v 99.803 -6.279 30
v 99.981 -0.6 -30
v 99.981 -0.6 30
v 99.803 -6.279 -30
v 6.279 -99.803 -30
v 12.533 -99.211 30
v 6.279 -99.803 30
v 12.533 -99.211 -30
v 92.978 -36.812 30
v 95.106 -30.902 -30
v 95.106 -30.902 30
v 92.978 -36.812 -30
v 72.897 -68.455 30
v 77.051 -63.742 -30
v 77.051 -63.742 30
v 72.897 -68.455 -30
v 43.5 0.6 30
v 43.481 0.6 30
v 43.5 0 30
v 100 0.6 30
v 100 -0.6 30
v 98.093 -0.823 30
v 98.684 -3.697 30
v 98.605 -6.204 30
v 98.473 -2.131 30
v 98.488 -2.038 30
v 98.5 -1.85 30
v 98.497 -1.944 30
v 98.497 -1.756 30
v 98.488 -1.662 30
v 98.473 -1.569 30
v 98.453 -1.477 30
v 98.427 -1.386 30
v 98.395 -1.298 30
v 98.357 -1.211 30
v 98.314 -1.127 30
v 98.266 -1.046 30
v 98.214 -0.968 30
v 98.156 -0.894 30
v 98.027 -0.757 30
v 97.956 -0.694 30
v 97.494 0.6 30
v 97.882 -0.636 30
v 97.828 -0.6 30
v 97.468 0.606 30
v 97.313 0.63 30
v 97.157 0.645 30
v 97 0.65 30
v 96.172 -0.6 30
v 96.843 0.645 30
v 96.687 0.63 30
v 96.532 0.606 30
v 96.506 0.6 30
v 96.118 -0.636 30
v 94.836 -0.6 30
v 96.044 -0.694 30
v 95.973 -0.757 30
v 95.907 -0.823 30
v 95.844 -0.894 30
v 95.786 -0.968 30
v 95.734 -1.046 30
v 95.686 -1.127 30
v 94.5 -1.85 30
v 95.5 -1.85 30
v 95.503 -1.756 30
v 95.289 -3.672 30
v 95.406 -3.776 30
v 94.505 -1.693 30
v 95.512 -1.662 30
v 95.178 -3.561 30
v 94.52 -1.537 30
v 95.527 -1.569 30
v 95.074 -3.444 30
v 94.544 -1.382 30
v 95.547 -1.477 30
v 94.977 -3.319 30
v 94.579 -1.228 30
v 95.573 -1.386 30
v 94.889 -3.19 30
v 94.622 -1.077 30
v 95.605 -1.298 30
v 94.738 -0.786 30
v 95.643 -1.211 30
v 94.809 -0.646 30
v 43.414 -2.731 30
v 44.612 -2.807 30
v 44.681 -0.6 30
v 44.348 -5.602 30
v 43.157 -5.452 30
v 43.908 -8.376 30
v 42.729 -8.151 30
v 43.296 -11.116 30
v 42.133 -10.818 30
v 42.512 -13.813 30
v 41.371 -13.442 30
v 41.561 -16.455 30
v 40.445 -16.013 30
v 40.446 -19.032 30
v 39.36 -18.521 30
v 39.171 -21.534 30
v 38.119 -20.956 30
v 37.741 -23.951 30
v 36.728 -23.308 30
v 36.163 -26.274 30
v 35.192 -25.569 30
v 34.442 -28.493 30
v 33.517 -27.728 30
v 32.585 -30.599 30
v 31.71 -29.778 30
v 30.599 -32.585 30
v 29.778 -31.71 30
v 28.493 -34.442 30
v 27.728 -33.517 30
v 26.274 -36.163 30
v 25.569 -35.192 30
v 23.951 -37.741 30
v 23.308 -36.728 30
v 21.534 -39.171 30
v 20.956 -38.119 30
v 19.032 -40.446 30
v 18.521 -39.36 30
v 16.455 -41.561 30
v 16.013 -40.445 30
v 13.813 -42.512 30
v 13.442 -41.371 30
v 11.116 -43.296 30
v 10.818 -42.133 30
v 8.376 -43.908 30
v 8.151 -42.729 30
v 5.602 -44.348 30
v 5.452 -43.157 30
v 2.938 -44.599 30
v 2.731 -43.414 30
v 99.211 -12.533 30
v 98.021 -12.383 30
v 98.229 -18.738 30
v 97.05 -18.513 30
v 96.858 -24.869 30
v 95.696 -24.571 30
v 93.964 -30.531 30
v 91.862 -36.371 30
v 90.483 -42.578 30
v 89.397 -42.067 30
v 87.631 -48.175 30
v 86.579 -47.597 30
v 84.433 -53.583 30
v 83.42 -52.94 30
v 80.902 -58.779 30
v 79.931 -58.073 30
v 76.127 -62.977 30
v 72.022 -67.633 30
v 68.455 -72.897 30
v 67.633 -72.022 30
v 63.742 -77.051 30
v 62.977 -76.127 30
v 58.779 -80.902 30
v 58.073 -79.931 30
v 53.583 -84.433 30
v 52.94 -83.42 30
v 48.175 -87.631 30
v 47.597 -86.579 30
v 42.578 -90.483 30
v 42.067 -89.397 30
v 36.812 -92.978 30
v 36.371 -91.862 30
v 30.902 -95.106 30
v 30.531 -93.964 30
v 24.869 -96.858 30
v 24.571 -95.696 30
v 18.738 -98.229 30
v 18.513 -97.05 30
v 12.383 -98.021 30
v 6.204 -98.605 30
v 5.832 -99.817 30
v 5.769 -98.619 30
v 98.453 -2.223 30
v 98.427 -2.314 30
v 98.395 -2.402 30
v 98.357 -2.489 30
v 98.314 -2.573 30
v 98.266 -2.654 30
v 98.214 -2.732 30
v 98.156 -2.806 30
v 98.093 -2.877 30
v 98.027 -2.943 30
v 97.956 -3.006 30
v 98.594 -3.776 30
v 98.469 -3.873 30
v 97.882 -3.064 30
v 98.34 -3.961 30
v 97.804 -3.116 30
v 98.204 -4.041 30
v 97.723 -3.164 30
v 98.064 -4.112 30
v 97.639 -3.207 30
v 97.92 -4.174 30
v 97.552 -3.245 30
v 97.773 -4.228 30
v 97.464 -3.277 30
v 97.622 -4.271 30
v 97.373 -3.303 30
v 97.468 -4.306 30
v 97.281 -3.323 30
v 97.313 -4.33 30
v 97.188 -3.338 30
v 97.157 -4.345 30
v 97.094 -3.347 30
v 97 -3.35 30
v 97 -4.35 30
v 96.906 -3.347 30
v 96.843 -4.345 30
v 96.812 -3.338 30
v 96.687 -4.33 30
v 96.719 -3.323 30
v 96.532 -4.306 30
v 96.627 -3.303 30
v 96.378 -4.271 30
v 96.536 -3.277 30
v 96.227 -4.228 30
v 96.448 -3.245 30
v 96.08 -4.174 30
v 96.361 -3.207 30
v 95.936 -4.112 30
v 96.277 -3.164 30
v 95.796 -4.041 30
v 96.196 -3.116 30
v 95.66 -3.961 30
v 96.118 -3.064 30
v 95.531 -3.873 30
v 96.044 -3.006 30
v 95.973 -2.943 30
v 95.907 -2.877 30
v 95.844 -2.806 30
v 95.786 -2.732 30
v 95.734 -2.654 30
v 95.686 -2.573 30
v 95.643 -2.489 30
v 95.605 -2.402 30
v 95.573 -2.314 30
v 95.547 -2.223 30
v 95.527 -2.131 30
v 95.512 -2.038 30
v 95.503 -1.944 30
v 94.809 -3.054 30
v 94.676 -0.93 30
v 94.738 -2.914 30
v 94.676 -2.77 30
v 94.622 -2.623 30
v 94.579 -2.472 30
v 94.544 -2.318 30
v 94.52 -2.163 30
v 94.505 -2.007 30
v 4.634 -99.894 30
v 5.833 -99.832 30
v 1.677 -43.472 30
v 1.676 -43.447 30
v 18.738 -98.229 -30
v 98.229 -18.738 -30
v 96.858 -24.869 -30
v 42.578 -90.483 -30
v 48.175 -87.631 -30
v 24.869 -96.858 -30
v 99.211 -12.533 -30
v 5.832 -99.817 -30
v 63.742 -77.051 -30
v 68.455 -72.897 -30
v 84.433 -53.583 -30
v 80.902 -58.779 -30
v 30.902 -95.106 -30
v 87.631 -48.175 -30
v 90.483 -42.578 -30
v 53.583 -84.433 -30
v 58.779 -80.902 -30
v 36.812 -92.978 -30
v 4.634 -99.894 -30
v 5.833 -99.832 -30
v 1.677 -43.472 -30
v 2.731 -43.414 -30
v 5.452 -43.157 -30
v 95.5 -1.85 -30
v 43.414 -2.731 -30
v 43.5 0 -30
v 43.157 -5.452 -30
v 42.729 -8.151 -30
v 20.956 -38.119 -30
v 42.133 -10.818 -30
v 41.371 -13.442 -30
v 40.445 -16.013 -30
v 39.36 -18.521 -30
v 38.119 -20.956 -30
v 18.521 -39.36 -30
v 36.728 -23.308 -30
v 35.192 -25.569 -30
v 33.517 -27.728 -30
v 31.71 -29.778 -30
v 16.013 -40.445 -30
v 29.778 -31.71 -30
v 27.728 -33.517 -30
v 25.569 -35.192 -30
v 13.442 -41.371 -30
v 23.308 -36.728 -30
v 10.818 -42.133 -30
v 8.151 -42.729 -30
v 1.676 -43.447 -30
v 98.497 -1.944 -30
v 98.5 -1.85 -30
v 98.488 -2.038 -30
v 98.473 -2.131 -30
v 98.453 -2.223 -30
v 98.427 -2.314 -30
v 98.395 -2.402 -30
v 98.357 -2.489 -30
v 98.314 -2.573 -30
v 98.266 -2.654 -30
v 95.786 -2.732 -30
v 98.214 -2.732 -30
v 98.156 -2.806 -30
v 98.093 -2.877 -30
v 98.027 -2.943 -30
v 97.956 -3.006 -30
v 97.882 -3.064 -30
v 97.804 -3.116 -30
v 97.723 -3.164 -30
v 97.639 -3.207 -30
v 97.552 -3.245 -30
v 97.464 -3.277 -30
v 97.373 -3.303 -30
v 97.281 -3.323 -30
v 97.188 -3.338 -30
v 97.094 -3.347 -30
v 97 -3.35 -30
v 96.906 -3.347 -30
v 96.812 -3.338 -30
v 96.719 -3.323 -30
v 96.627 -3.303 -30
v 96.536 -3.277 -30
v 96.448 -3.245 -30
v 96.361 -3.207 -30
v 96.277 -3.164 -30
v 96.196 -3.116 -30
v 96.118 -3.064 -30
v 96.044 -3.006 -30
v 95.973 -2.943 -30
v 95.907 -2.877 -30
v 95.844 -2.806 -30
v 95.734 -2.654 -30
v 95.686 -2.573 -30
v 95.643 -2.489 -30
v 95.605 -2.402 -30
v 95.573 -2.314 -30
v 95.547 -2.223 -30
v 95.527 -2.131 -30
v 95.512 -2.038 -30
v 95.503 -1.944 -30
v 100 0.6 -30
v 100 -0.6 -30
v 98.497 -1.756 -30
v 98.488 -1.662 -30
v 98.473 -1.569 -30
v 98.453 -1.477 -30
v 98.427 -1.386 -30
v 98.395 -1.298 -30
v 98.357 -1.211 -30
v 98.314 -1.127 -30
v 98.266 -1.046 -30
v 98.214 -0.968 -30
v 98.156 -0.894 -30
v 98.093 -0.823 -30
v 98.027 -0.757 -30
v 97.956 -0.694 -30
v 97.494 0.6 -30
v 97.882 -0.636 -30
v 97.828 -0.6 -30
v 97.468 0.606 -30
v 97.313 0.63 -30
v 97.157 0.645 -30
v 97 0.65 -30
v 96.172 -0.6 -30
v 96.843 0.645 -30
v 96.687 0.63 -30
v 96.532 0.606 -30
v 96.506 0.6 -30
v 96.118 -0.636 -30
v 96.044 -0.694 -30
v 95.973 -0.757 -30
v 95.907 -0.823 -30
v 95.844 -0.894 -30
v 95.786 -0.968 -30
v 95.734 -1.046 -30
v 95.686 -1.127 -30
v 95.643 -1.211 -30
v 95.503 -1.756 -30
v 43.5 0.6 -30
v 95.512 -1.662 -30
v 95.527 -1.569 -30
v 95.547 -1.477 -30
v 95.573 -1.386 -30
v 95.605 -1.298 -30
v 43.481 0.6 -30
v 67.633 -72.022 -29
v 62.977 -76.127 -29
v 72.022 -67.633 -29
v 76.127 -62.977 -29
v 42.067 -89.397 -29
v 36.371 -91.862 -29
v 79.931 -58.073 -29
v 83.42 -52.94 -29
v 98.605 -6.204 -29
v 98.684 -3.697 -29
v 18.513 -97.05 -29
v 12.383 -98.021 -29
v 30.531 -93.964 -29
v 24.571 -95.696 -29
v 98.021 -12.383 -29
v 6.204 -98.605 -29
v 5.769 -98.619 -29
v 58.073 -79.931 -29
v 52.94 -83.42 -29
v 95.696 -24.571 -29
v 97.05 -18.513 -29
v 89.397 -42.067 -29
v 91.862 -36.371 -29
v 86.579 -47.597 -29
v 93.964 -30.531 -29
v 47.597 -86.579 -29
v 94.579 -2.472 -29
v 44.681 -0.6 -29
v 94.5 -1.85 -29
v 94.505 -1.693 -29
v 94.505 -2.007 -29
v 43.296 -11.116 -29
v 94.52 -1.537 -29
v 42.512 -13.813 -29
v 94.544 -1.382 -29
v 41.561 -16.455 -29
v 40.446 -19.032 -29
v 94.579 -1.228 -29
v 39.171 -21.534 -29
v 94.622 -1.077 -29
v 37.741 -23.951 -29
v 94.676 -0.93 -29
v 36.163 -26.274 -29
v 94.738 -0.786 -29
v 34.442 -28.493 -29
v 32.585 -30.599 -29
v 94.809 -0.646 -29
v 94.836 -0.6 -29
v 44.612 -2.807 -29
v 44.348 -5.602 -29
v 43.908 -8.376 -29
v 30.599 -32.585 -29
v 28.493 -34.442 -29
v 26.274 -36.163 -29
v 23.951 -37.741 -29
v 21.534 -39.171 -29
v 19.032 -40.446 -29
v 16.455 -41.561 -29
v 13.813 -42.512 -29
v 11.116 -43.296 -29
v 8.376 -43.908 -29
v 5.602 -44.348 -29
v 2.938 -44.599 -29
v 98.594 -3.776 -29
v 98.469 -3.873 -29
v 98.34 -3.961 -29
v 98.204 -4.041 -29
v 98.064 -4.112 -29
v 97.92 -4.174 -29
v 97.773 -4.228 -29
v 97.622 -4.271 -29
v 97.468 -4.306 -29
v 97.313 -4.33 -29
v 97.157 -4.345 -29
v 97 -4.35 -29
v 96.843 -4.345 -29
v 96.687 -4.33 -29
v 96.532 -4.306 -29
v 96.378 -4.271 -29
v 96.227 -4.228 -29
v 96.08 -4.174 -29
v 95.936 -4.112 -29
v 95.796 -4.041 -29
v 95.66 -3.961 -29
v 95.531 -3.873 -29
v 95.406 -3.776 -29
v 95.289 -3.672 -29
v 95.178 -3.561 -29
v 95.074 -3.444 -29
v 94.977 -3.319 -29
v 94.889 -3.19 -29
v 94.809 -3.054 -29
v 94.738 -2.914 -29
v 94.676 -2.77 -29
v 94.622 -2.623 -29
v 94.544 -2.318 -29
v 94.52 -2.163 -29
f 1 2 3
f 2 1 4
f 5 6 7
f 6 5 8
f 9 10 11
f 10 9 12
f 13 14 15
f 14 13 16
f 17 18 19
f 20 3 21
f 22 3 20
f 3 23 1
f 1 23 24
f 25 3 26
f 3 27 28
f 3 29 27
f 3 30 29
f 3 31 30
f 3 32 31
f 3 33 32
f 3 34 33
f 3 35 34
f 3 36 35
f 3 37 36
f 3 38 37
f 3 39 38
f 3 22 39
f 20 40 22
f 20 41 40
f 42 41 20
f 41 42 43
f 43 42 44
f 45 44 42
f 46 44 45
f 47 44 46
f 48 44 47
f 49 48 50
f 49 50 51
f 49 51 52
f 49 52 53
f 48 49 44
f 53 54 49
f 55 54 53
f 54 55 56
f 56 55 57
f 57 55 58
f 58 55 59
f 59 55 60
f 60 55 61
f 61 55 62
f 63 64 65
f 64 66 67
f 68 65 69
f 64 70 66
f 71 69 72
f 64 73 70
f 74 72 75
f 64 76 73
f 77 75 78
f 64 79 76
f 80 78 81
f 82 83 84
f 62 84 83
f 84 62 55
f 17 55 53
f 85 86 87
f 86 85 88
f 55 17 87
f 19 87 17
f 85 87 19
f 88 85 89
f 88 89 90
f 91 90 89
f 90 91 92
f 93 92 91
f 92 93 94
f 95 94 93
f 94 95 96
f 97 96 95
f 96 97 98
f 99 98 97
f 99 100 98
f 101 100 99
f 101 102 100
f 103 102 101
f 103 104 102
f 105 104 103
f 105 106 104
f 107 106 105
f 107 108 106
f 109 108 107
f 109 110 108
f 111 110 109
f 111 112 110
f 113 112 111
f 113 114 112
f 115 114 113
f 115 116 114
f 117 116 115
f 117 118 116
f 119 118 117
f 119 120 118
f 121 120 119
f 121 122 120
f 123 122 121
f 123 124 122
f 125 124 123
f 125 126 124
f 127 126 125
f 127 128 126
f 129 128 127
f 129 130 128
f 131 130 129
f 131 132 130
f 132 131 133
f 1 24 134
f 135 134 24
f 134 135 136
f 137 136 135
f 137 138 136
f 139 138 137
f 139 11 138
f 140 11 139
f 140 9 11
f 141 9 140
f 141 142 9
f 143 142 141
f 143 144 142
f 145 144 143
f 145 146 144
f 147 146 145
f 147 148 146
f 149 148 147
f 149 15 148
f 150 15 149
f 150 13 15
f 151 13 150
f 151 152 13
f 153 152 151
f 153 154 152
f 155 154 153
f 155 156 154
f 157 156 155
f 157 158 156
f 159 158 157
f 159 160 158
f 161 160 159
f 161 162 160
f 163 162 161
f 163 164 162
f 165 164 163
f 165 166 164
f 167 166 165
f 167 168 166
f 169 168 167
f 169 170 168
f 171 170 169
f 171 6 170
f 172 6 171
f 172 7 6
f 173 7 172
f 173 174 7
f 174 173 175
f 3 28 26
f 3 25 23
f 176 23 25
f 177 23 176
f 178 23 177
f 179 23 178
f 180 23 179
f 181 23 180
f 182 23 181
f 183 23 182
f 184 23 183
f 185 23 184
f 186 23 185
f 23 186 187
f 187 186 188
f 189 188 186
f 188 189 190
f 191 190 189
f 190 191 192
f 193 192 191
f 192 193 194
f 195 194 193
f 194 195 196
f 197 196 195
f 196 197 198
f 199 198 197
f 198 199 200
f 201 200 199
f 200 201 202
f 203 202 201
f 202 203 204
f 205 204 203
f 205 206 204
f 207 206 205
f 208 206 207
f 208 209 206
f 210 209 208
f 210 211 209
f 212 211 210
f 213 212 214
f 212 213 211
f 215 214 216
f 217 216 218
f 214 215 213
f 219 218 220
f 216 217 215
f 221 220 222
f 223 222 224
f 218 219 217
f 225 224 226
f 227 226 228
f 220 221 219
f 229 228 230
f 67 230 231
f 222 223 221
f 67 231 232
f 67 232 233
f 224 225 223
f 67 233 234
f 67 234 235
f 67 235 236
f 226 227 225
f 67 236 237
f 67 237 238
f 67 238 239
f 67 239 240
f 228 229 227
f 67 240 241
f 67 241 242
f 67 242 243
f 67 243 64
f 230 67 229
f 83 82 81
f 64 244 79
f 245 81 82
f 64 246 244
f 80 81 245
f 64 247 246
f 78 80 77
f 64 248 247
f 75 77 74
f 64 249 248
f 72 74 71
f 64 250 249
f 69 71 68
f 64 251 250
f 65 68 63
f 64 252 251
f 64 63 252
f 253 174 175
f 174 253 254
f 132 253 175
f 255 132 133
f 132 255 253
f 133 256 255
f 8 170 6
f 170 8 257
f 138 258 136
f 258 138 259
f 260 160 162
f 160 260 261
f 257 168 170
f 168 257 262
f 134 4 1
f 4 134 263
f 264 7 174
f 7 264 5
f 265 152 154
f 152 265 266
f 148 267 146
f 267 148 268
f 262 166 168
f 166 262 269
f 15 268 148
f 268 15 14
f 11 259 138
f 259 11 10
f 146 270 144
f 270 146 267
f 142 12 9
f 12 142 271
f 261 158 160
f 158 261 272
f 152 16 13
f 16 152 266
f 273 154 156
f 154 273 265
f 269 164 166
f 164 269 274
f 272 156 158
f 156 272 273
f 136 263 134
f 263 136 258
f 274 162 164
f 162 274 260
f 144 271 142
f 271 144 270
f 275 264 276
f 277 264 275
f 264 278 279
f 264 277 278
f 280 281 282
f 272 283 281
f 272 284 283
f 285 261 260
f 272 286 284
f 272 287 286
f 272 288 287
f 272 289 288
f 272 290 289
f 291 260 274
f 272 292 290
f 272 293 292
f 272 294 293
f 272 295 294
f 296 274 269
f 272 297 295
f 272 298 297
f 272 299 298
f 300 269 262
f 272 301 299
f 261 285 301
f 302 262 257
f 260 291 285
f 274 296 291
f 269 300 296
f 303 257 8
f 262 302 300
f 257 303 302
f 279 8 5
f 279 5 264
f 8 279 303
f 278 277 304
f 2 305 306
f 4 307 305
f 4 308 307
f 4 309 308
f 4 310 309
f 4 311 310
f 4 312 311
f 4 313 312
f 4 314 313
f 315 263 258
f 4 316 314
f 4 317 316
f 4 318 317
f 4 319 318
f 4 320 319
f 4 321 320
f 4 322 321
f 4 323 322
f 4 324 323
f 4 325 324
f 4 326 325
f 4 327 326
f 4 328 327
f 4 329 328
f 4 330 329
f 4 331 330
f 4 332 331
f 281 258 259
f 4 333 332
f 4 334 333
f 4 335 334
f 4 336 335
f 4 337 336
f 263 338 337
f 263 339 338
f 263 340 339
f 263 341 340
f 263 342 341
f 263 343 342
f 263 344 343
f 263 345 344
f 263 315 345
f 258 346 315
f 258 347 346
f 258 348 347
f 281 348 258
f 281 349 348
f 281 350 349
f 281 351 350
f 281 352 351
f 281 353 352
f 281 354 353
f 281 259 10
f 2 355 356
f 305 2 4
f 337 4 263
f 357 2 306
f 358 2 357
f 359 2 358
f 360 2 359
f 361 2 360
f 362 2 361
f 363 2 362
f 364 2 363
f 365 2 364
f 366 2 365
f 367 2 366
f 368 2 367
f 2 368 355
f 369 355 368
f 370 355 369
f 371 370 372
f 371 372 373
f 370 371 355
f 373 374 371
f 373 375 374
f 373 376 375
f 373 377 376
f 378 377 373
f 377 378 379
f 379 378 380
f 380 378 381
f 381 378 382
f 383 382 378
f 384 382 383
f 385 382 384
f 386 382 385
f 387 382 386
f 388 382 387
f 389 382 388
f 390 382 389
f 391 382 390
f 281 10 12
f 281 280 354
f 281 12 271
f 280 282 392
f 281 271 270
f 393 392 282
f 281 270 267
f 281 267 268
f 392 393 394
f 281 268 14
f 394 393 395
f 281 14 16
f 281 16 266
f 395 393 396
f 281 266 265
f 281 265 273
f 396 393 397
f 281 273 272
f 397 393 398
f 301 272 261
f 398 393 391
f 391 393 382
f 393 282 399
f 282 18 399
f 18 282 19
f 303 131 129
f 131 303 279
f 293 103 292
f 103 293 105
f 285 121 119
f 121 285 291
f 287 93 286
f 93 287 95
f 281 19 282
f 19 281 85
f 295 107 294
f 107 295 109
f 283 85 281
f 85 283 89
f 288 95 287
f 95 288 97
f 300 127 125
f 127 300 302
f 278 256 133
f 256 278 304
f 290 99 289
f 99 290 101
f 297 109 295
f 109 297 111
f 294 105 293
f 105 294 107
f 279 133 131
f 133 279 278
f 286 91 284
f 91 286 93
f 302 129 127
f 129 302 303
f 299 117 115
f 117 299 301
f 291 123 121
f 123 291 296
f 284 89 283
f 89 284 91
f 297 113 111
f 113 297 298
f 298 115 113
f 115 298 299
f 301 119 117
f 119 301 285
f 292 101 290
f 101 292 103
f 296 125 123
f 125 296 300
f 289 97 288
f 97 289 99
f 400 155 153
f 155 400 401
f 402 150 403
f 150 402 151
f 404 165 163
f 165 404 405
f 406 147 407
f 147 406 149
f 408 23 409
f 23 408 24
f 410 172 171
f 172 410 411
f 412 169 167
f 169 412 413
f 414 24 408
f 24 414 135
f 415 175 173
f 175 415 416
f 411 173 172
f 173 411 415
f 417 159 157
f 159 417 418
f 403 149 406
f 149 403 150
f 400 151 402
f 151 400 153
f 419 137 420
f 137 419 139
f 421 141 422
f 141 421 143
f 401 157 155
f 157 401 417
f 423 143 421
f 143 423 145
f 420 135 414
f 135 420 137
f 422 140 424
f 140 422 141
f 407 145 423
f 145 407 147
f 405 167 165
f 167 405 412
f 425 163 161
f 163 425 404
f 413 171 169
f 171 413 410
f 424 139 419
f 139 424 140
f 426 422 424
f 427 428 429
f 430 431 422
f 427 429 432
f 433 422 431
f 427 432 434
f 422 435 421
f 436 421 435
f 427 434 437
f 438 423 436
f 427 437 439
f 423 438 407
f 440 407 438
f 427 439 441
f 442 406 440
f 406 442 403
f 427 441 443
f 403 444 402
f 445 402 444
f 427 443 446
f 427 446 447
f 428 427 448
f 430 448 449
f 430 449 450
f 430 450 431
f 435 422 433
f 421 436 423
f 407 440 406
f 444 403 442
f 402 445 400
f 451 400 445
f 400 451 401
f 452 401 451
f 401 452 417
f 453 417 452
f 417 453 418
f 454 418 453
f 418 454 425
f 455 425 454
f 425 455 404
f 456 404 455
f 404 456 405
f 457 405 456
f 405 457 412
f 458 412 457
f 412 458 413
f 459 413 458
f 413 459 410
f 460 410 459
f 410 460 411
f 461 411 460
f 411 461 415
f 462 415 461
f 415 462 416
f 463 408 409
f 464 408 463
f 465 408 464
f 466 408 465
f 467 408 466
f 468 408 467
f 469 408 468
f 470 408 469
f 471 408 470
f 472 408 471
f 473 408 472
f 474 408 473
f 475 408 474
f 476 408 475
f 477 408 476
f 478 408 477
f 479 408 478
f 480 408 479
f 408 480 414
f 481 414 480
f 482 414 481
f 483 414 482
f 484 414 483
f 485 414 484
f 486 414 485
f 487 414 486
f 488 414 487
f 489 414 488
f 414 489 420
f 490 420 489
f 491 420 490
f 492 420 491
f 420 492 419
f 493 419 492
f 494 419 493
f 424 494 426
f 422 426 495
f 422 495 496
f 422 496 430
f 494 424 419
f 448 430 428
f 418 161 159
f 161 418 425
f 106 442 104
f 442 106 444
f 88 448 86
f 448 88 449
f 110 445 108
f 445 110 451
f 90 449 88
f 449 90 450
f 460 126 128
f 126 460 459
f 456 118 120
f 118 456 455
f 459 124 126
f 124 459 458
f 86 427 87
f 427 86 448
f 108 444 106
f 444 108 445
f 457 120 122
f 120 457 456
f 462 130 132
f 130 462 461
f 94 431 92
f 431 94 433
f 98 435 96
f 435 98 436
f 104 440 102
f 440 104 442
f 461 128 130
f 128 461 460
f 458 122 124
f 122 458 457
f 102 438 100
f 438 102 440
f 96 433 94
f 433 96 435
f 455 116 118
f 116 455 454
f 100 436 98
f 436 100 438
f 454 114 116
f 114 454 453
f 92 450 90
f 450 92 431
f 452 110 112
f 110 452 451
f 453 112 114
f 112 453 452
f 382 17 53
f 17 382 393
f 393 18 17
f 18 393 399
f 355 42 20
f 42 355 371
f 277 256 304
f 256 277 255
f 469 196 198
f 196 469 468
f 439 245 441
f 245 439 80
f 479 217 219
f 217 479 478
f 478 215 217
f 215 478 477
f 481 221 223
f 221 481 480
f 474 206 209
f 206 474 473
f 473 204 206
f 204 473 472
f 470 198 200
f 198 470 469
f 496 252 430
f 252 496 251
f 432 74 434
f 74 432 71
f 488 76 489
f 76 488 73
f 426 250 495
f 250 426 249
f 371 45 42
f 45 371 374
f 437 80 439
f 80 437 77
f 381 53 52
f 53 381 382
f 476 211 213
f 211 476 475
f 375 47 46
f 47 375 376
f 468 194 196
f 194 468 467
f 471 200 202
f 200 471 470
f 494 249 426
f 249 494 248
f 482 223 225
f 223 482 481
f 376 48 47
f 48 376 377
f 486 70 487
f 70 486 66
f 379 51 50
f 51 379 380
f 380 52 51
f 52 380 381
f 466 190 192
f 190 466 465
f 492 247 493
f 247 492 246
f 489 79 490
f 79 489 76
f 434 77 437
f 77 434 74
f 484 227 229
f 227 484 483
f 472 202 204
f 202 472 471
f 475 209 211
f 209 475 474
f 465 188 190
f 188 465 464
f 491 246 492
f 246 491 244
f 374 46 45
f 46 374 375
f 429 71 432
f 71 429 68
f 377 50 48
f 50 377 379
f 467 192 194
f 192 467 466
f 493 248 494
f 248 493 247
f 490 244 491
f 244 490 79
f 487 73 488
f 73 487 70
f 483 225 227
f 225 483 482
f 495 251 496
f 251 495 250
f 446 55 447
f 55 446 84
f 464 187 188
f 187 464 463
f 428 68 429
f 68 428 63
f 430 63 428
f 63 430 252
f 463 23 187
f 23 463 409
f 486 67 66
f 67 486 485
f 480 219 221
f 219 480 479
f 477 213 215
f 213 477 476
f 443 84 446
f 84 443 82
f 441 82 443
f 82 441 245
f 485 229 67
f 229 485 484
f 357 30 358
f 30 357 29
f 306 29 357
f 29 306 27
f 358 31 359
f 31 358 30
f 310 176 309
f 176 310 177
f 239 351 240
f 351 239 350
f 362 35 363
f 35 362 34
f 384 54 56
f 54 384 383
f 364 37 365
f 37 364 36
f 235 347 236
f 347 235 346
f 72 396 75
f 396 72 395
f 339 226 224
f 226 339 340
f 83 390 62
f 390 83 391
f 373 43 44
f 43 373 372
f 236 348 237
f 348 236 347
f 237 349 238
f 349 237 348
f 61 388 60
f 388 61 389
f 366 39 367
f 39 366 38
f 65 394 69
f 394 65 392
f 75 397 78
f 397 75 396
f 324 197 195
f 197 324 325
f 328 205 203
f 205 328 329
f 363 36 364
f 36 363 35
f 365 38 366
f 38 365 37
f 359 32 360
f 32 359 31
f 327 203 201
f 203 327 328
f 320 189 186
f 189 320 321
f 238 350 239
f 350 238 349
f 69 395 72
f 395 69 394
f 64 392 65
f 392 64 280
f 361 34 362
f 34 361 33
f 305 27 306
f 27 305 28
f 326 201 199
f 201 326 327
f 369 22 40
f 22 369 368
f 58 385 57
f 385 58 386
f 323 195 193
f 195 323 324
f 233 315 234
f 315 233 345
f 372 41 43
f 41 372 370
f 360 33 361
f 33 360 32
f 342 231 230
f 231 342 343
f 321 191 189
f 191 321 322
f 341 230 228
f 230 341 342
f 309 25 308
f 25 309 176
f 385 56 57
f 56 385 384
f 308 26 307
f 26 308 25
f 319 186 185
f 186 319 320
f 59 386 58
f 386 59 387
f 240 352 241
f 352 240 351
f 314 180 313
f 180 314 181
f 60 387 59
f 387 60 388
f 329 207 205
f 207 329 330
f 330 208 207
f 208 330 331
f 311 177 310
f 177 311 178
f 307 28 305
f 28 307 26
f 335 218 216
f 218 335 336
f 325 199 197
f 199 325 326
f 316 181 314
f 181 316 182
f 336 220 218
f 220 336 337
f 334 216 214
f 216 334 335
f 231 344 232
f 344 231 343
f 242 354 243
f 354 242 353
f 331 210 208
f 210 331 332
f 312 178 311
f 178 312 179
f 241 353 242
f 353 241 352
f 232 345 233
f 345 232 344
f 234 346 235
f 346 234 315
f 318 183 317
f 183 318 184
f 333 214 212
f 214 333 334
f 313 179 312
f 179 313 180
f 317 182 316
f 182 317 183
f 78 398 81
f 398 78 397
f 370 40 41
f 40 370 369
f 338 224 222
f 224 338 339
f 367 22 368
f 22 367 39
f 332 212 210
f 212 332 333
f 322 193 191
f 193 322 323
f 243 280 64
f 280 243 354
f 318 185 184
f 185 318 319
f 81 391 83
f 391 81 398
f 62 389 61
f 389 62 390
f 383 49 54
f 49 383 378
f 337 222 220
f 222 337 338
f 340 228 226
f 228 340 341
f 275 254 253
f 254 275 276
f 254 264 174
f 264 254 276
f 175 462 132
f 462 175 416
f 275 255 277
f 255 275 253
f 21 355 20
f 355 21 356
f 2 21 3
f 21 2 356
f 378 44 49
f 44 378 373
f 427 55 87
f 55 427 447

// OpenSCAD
// bits and bobs for a spool-based tool organizer
// 2019 Troseph
// https://www.thingiverse.com/thing:3626779

$fn=100;
//  spool info
mainDia=200;
innerDia=87;
wallthickness=1.2;
middleDia=140;
// set to 60 for type 1
wallheight=60;

//  variables for type 5
//  the tool holder diameter (must be slightly larger than the tool)
toolHandleDia=15;
//  hole for tool to go through
toolDia=6;
//  depth of the cup to hold a tool
toolHolderHeight=15;

//  type 1 is for 1/4th swinging drawers
//  type 2 is half a bottom tray
//  type 3 is the whole bottom tray, but I don't know how you'll get it on a typical spool
//  type 4 is 1/6th tray with center dividers
//  type 5 is for screw driver holders
type=1;

// magic
spokeLen=(mainDia/2)-(innerDia/2);
spokeOffset=(innerDia/2)+(spokeLen/2);

module do_it(){
  if (type==1) {
    bottom_cup_1_4th();
  }
  if (type==2) {
    bottom_cup_half();
  }
  if (type==3) {
    bottom_cup();
  }
  if (type==4) {
    bottom_cup_1_6th();
  }
  if (type==5) {
    tool_holder();
  }
}


module bottom_cup_half(){
  difference(){
    bottom_cup();
    chop_block();
  }
}
module chop_block(){
  translate([0,(mainDia/2)+(wallthickness/2),0])cube([mainDia,mainDia,(wallheight+4)],true);
}
module bottom_cup_1_4th(){
  rotate([0,0,-87]) translate([spokeOffset,0,0])cube([spokeLen,wallthickness,wallheight],true);
  translate([spokeOffset,0,0])cube([spokeLen,wallthickness,wallheight],true);
  difference(){
    union(){
      translate([spokeOffset+((spokeLen/2)-3),-1.85,0])cylinder(h=wallheight,d=5,center=true);
      difference(){
        bottom_cup();
        chop_block();
        rotate([0,0,93]) chop_block();
      }
    }
    translate([spokeOffset+((spokeLen/2)-3),-1.85,0])cylinder(h=wallheight+2,d=3,center=true);
  }
}
module bottom_cup_1_6th(){
  difference(){
    bottom_cup();
    rotate([0,0,60]) chop_block();
    rotate([0,0,-60]) chop_block();
  }
}

module bottom_cup(){
  //mainbody
  difference(){
    cylinder(h=wallheight,d=mainDia,center=true);
    translate([0,0,0])cylinder(h=(wallheight+4),d=innerDia,center=true);
    translate([0,0,1])cylinder(h=wallheight,d=mainDia-(wallthickness*2),center=true);
  };
 //inner ring
  difference(){
    cylinder(h=wallheight,d=innerDia+(wallthickness*2),center=true);
    translate([0,0,1])cylinder(h=(wallheight+4),d=innerDia,center=true); 
  }
  if (type!=1) {
    //middle ring
    difference(){
      cylinder(h=wallheight,d=middleDia,center=true);
      translate([0,0,1])cylinder(h=(wallheight+4),d=middleDia-(wallthickness*2),center=true); 
    }
    //spokes
    for (i = [0 : 5]){
    rotate([0,0,i*60]) translate([spokeOffset,0,0])cube([spokeLen,wallthickness,wallheight],true);
    }
 }
}

module tool_holder(){
  difference(){
    cylinder(h=toolHolderHeight,d=toolHandleDia+wallthickness,center=true);
    translate([0,0,wallthickness])cylinder(h=toolHolderHeight,d=toolHandleDia,center=true);
    translate([0,0,-(toolHolderHeight/2)])cylinder(h=toolHolderHeight,d=toolDia,center=true);
  }
};

do_it();
